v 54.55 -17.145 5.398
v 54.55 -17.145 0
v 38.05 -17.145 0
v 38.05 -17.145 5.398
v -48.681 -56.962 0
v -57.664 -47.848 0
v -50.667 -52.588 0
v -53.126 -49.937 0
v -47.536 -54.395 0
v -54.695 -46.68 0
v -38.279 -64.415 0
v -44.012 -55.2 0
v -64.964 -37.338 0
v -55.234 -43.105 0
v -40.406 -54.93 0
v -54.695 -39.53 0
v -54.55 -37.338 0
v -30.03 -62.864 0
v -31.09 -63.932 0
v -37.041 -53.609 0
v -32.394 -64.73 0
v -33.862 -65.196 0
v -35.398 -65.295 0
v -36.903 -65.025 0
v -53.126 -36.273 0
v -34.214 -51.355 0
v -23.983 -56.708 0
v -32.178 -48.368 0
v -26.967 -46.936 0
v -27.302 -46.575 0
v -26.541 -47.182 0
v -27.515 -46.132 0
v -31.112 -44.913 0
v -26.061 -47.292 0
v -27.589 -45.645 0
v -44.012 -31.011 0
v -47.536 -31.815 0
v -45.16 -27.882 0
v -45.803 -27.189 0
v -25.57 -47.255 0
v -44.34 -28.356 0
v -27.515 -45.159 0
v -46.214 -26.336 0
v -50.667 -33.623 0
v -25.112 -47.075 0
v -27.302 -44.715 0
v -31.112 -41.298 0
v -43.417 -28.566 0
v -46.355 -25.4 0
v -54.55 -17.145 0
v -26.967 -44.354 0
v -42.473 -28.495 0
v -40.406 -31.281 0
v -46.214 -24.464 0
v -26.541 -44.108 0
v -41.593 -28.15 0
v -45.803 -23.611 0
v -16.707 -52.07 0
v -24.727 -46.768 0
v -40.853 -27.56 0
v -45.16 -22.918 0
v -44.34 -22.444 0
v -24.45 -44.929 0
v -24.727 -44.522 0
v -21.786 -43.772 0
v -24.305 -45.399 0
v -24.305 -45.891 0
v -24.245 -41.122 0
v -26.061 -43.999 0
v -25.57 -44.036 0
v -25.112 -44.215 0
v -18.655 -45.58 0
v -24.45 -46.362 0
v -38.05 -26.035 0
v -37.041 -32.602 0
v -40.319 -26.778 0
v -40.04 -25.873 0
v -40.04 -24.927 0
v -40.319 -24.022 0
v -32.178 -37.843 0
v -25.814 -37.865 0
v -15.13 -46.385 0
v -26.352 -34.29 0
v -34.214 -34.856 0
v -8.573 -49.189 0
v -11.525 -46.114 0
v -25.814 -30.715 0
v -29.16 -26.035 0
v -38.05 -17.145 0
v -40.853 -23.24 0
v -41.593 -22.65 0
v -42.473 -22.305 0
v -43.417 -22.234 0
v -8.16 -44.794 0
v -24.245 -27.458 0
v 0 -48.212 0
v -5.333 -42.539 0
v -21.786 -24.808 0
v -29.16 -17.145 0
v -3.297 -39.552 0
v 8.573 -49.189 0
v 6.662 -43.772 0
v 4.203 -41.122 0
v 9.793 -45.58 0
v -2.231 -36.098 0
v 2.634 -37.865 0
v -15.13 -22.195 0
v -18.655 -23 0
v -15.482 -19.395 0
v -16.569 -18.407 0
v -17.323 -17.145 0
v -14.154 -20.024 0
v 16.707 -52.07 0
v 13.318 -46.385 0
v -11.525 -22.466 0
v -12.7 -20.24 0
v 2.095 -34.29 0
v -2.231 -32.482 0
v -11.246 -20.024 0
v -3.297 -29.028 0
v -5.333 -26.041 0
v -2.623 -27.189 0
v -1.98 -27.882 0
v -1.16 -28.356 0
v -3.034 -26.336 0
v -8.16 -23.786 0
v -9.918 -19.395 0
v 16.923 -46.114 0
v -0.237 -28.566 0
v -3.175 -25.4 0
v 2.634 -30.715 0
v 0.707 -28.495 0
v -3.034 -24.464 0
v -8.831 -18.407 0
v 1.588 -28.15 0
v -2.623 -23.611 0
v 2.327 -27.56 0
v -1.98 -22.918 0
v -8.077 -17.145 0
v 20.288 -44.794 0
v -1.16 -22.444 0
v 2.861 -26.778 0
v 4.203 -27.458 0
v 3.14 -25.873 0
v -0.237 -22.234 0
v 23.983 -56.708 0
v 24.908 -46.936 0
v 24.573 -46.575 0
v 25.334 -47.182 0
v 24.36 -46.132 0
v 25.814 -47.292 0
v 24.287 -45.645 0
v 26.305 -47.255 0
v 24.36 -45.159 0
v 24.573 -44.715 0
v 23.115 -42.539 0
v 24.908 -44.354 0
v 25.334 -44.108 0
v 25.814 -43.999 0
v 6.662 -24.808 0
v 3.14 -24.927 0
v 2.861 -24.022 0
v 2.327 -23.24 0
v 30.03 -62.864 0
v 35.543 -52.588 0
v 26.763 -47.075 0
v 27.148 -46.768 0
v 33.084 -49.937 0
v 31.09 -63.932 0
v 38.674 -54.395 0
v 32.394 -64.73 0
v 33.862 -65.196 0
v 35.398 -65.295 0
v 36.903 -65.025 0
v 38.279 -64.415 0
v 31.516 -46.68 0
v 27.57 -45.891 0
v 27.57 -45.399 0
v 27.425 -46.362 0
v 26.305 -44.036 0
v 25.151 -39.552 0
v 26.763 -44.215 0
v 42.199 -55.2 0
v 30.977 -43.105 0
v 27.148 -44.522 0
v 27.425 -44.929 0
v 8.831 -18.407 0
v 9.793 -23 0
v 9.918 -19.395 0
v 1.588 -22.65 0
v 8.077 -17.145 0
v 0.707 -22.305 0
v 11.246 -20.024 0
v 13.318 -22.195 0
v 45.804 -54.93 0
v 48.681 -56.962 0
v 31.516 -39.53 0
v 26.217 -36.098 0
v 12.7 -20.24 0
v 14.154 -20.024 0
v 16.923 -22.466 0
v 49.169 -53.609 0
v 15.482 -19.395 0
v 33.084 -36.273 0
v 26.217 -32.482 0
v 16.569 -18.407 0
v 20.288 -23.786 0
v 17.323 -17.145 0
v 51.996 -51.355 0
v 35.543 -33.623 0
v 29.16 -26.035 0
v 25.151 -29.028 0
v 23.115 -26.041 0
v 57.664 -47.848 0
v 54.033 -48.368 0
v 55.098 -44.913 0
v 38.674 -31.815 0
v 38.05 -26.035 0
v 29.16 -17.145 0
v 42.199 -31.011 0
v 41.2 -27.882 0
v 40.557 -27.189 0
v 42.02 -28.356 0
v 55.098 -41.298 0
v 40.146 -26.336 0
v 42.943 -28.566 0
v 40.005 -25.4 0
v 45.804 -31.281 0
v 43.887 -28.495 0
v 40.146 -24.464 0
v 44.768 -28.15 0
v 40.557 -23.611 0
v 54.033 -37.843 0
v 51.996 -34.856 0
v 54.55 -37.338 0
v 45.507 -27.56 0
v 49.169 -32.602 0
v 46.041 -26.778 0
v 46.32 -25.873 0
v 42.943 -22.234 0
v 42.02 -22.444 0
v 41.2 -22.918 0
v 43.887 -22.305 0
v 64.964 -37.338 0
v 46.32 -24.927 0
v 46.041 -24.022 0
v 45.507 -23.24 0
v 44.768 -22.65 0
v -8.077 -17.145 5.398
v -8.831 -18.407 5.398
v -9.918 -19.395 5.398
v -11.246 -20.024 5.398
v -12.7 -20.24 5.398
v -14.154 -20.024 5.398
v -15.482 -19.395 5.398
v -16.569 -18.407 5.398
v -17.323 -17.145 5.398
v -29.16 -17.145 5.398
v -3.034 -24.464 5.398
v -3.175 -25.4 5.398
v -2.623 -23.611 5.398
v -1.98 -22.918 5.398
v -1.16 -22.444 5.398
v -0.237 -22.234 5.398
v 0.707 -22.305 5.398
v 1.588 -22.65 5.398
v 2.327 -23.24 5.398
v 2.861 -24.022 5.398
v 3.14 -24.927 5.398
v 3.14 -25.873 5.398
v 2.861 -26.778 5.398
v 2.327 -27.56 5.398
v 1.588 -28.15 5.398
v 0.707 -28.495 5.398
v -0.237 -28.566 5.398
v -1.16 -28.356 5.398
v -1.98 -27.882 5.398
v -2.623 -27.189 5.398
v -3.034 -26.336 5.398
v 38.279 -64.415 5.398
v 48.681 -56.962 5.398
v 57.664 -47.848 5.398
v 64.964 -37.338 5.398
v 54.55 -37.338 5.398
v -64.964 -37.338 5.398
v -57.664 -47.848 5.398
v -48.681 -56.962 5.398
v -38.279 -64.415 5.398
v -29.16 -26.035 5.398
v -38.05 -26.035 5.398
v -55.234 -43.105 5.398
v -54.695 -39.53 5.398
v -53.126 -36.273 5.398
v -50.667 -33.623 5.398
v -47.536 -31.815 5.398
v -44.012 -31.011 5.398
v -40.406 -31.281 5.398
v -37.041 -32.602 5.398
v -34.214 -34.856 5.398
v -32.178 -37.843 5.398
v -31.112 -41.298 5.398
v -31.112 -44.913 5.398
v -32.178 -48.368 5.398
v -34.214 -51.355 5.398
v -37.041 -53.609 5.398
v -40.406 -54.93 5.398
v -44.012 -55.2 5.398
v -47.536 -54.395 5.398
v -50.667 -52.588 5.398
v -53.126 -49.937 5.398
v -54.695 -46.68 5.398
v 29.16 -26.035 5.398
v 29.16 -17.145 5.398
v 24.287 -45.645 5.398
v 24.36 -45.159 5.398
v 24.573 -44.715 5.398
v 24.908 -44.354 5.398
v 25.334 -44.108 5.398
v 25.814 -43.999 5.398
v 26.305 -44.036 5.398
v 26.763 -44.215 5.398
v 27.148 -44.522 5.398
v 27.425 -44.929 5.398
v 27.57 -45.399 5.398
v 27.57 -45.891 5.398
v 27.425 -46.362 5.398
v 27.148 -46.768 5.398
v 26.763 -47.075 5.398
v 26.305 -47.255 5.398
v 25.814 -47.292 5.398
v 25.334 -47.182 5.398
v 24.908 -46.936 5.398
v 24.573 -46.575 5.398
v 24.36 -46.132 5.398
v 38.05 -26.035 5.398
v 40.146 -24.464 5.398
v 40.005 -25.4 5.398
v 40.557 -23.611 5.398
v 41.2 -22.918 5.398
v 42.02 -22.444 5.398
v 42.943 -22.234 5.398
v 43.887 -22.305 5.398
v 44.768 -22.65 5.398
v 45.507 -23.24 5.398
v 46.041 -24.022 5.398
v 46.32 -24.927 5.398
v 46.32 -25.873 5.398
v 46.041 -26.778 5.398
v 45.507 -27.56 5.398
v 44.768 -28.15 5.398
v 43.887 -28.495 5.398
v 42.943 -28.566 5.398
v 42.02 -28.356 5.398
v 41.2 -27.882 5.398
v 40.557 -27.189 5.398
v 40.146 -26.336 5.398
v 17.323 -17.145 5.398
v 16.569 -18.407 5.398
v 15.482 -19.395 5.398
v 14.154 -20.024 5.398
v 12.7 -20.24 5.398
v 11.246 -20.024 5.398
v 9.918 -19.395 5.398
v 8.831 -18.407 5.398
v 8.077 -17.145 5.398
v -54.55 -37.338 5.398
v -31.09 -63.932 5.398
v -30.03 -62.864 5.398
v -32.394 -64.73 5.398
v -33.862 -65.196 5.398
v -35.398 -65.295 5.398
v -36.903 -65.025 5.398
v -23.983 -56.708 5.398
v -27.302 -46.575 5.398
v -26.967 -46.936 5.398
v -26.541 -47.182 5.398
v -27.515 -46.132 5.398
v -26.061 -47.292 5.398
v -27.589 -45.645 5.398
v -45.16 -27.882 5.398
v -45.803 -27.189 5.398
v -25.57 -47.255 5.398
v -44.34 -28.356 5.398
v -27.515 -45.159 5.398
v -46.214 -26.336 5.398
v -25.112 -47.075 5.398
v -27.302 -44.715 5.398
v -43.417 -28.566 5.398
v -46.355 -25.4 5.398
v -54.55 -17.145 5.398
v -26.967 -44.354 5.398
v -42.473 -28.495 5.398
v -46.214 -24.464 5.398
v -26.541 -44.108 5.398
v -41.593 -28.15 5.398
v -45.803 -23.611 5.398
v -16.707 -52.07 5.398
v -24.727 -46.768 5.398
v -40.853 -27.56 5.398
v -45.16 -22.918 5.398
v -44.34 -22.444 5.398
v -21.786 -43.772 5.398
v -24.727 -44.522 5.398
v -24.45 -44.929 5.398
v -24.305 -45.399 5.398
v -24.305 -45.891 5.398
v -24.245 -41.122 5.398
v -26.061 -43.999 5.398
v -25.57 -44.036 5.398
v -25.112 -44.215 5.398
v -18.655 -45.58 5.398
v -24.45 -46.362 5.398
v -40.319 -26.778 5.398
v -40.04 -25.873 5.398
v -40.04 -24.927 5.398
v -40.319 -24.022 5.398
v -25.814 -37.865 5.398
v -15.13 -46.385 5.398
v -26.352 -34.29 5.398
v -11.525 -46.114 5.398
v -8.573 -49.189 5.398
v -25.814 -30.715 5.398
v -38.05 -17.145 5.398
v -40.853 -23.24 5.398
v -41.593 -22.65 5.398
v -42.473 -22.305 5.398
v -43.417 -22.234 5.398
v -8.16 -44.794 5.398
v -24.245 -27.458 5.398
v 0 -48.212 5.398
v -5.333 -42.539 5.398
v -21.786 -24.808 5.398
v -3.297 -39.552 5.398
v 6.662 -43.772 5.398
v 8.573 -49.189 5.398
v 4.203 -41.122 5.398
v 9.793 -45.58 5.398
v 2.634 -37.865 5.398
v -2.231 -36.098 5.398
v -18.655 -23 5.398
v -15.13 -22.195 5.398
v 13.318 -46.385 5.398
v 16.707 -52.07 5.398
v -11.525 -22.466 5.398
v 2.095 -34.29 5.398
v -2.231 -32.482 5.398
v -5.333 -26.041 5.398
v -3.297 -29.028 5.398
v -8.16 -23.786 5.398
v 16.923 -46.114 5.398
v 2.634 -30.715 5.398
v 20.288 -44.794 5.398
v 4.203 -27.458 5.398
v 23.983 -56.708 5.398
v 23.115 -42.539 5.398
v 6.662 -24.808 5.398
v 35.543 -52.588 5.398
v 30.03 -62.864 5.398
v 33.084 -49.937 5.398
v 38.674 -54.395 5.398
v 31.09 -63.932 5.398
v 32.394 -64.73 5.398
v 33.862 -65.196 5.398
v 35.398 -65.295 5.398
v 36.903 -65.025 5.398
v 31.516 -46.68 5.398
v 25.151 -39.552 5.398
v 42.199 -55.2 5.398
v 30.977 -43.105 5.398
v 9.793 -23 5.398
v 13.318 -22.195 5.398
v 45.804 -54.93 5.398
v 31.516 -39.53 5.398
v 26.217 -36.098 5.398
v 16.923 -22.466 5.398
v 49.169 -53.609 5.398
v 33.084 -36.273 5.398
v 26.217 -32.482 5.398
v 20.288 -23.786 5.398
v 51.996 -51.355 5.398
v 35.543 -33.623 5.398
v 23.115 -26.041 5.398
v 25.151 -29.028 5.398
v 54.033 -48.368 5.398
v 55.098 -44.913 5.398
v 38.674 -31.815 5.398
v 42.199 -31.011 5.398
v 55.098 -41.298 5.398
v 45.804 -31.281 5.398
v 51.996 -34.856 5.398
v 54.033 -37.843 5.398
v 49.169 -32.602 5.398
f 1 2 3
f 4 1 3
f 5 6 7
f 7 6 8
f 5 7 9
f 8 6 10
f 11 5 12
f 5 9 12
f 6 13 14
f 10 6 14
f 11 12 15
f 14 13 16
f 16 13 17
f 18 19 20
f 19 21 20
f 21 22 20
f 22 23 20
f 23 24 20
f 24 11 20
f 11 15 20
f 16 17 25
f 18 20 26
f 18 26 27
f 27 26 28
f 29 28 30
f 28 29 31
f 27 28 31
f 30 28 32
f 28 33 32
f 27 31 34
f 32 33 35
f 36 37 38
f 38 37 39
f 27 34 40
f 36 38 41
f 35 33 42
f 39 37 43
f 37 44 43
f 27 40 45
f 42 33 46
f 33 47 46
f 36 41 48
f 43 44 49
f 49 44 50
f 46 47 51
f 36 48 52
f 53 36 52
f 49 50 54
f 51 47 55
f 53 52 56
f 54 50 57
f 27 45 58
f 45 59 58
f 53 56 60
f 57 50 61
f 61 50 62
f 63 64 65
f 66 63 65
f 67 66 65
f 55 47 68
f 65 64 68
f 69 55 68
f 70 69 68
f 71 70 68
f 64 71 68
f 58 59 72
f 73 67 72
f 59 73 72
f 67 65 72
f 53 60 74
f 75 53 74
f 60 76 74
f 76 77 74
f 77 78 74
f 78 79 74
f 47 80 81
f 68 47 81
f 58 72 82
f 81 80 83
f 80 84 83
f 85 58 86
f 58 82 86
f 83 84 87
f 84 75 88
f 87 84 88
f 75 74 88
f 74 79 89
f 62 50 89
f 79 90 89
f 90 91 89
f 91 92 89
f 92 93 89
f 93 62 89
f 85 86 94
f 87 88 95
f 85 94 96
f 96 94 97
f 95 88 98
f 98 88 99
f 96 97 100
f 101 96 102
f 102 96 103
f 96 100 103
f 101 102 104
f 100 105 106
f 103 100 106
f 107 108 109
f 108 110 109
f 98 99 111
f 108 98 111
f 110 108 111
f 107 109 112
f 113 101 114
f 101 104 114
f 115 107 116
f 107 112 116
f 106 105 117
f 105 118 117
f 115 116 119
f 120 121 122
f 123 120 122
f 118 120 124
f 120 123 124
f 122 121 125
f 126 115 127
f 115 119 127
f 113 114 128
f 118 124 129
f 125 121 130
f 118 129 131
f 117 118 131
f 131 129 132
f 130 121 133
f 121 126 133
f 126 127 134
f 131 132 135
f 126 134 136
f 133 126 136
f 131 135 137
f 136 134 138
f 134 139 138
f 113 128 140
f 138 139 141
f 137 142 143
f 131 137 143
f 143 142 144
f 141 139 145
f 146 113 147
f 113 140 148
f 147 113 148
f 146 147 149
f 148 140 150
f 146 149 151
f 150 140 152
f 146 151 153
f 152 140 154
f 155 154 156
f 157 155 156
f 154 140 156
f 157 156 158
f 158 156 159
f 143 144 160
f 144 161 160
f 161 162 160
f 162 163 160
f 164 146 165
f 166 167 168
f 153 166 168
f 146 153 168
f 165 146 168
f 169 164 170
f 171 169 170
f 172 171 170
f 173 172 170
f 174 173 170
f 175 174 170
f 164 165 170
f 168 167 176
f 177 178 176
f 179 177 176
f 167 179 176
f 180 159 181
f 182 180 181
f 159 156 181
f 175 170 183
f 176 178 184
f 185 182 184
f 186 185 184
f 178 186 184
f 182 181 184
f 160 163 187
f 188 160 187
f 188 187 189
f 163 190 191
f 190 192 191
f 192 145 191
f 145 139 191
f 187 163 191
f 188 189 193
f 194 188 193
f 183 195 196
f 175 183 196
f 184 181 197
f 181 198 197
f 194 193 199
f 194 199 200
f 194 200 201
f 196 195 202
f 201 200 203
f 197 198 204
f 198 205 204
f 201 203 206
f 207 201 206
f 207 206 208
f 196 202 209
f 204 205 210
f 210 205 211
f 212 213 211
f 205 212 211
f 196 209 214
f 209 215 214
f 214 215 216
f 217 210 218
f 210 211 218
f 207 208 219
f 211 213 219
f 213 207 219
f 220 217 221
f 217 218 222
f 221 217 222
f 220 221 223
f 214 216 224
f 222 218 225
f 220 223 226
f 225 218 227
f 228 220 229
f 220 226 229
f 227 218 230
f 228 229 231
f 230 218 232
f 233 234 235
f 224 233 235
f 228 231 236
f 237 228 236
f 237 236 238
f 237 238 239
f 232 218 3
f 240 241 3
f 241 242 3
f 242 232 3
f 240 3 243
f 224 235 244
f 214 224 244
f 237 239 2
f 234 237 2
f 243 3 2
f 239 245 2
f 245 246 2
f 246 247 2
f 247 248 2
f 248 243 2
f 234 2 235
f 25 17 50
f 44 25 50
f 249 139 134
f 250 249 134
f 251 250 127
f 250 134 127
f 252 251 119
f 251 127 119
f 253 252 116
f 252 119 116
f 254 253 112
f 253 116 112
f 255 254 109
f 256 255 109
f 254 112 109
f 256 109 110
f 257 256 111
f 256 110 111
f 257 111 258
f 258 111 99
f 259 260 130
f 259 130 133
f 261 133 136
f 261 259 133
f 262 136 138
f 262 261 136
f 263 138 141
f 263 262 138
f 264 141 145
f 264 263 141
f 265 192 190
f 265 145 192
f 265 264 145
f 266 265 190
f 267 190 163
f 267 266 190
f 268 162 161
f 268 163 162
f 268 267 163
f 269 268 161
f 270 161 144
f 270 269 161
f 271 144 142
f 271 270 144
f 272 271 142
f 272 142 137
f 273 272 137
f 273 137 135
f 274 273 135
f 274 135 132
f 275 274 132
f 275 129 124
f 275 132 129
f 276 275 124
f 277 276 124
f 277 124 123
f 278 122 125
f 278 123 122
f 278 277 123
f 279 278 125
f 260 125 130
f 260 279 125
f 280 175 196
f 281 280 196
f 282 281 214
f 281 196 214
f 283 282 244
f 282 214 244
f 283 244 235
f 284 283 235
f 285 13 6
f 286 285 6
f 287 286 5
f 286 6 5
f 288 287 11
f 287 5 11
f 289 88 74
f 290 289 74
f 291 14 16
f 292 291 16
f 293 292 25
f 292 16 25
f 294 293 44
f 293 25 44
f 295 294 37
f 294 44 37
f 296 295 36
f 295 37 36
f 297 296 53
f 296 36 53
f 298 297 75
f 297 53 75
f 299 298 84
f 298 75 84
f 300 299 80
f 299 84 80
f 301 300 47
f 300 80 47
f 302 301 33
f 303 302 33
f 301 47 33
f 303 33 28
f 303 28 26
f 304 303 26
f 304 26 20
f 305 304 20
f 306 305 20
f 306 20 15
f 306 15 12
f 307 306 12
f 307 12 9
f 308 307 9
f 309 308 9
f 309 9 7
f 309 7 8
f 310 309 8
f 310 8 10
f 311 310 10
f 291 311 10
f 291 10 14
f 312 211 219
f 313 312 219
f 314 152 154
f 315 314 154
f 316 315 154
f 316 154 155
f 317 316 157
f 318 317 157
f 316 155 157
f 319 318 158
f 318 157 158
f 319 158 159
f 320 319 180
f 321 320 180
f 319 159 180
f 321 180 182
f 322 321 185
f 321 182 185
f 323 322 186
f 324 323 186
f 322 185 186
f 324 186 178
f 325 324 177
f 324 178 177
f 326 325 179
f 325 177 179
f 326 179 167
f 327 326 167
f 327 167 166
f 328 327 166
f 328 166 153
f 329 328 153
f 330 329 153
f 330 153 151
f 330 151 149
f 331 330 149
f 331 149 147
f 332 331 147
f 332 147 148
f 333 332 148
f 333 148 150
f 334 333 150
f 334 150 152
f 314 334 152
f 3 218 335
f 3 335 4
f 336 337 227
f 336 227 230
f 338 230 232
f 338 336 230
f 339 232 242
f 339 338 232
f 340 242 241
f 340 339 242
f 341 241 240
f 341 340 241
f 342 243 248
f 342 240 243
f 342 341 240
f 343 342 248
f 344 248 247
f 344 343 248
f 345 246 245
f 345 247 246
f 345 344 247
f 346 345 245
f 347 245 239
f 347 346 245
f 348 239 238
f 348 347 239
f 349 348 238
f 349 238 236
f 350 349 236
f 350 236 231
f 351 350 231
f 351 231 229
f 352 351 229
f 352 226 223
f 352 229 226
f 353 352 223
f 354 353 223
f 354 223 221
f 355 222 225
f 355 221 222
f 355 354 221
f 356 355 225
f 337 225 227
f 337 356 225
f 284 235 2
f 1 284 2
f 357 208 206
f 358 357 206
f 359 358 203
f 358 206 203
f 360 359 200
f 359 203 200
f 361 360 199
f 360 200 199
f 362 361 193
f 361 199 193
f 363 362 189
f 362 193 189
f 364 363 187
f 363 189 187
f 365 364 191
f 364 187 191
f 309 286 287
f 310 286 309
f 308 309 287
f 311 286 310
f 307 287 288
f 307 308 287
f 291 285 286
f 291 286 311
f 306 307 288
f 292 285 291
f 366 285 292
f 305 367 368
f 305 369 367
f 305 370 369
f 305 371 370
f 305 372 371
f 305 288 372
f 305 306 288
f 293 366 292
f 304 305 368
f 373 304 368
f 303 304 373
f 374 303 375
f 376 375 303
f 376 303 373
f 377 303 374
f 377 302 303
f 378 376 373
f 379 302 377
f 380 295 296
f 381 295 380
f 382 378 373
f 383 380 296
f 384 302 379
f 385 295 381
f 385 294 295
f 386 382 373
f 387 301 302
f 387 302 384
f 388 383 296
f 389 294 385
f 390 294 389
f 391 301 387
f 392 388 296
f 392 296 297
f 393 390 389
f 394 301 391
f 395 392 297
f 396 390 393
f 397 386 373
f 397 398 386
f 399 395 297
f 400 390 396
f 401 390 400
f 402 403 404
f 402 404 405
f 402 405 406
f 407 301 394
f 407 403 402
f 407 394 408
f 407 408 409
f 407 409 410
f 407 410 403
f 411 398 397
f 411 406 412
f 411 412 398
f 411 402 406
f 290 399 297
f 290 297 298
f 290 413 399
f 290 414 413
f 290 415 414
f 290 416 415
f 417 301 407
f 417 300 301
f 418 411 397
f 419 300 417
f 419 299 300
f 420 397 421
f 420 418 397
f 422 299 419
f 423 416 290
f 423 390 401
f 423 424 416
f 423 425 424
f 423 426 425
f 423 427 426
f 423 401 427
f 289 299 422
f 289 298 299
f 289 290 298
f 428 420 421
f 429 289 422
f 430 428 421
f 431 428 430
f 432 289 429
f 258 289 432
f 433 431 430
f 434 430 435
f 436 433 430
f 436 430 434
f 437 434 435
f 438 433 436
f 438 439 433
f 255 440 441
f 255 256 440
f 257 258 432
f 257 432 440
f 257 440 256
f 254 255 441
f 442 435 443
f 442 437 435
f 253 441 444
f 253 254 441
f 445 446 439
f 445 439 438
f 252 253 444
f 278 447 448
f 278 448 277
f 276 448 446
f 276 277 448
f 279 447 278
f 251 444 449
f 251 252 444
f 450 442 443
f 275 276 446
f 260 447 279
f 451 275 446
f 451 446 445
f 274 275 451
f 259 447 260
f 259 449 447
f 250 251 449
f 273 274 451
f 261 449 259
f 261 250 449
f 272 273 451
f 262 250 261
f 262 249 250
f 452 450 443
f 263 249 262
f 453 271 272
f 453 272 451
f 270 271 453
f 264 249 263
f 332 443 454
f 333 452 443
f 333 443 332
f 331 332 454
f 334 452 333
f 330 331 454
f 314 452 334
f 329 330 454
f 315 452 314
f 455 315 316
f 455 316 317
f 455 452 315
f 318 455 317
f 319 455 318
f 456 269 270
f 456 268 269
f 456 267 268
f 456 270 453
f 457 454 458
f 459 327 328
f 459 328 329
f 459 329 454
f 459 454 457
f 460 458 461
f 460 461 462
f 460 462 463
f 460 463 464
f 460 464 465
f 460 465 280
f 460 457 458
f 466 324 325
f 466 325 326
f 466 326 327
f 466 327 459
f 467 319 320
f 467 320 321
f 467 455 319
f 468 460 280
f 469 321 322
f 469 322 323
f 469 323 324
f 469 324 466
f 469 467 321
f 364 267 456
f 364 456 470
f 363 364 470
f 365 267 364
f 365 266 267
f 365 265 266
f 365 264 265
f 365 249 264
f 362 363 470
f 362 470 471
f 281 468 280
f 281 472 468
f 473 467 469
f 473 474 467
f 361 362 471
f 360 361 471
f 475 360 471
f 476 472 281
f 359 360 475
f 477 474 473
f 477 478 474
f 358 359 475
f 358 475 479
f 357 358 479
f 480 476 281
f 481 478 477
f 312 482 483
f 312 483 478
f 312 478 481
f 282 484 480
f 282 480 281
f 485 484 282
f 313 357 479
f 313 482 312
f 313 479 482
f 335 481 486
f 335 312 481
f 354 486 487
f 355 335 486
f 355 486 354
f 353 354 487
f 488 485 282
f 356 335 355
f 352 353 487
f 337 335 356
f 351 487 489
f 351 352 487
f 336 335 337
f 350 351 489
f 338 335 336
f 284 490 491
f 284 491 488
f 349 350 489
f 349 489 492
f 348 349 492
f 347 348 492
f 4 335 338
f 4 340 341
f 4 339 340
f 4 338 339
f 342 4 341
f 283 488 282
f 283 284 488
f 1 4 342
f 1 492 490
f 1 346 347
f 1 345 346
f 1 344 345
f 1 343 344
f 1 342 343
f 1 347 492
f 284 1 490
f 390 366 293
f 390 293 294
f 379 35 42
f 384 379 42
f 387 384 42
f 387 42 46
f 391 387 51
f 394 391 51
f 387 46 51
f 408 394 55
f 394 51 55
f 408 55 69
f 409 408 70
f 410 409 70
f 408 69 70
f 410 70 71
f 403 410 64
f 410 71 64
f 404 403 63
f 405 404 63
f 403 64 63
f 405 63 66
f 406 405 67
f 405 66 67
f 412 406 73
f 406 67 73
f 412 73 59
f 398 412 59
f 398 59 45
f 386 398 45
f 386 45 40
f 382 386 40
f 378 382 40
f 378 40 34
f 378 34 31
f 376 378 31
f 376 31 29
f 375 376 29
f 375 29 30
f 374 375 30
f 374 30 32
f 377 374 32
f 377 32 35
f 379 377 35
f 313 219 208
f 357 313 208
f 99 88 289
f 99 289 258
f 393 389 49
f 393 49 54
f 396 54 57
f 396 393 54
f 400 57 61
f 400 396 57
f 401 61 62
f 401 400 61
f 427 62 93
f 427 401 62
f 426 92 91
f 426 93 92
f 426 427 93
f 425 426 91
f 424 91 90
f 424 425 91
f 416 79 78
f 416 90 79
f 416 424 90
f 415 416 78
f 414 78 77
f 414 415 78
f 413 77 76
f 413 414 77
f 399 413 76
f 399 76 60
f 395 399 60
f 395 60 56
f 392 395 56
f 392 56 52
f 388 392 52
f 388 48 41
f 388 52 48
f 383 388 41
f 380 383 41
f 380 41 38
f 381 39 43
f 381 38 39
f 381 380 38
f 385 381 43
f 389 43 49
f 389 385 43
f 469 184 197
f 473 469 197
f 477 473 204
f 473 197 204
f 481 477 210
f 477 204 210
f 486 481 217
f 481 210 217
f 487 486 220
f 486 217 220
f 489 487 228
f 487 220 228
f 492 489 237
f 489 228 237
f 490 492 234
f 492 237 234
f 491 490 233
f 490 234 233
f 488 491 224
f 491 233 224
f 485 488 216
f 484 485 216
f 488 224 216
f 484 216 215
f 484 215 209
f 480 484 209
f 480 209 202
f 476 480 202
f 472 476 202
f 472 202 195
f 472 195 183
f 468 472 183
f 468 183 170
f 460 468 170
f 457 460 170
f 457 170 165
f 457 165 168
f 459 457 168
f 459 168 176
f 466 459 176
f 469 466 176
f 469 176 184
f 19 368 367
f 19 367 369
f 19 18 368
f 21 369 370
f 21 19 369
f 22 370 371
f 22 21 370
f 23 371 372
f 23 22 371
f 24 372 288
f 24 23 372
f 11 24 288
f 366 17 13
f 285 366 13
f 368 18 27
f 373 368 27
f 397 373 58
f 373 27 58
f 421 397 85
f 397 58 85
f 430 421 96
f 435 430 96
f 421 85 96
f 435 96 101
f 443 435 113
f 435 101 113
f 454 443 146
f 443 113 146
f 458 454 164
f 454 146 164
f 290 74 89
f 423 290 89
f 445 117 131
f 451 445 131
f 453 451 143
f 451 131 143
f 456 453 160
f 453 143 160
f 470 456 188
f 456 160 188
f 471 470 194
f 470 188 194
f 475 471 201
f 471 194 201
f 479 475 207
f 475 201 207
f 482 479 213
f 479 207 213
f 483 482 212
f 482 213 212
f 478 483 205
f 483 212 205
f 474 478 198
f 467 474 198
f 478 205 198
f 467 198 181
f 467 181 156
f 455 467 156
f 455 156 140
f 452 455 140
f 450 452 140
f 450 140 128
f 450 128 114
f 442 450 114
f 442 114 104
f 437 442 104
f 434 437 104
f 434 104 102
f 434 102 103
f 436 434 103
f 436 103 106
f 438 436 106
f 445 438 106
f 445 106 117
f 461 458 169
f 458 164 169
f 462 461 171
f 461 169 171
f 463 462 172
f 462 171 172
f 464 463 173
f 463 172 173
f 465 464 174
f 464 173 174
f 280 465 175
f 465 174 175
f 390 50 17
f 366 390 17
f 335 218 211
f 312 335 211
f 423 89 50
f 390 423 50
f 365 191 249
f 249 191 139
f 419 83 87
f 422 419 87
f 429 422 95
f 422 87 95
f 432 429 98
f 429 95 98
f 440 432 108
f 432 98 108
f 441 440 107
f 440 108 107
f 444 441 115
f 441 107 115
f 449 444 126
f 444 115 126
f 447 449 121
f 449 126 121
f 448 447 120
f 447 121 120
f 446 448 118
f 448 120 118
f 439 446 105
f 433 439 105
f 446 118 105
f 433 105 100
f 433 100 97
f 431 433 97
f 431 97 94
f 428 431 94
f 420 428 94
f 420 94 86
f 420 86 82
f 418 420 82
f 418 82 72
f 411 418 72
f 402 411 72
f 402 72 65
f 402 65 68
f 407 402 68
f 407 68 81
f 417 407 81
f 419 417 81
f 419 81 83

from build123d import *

# Parameters (mm, degrees)
SKETCH1_R                 = 1.651
BOSS_EXTRUDE2_DEPTH       = 5.3975
SKETCH2_R                 = 1.143
CUT_EXTRUDE1_DEPTH        = 6.3975
SKETCH3_R                 = 12.1285
CUT_EXTRUDE2_DEPTH        = 6.3975
SKETCH4_W                 = 28.562713242
SKETCH4_H                 = 11.677503754
BOSS_EXTRUDE3_DEPTH       = 5.3975
SKETCH5_W                 = 216.7214489
SKETCH5_H                 = 130.569220634
CUT_EXTRUDE4_DEPTH        = 6.3975
SKETCH6_R                 = 38.1
CUT_EXTRUDE5_DEPTH        = 60.96
FILLET1_R                 = 6.35
FILLET2_R                 = 6.35
SKETCH102_W               = 8.89
SKETCH102_H               = 8.89
CUT_EXTRUDE101_DEPTH      = 6.3975001
SKETCH105_R               = 5
CUT_EXTRUDE104_DEPTH      = 10
SKETCH106_R               = 3.175
CUT_EXTRUDE105_DEPTH      = 103.378
CUT_EXTRUDE105_DEPTH_BACK = 1
SKETCH158_R               = 1.651
CUT_EXTRUDE157_DEPTH      = 97.79


with BuildPart() as part:
    # Sketch1 → Boss-Extrude2 (new body)
    with BuildSketch(Plane.XY):
        with BuildLine():
            Line((-64.964441474, 37.338), (-54.550441474, 37.338))
            Line((-54.550441474, 37.338), (-54.550441474, -37.338))
            Line((-54.550441474, -37.338), (-64.964441474, -37.338))
            ThreePointArc((-64.964441474, -37.338), (0, -74.93), (64.964441474, -37.338))
            Line((64.964441474, -37.338), (54.550441474, -37.338))
            Line((54.550441474, -37.338), (54.550441474, 37.338))
            Line((54.550441474, 37.338), (64.964441474, 37.338))
            ThreePointArc((64.964441474, 37.338), (0, 74.93), (-64.964441474, 37.338))
        make_face()
        with Locations((-46.482, 11.049)):
            Circle(SKETCH1_R, mode=Mode.SUBTRACT)
        with Locations((-21.083270032, 10.795)):
            Circle(SKETCH1_R, mode=Mode.SUBTRACT)
        with Locations((-21.083270032, -10.795)):
            Circle(SKETCH1_R, mode=Mode.SUBTRACT)
        with Locations((-46.482, -11.049)):
            Circle(SKETCH1_R, mode=Mode.SUBTRACT)
        with Locations((46.482, -11.049)):
            Circle(SKETCH1_R, mode=Mode.SUBTRACT)
        with Locations((21.083270032, -10.795)):
            Circle(SKETCH1_R, mode=Mode.SUBTRACT)
        with Locations((21.083270032, 10.795)):
            Circle(SKETCH1_R, mode=Mode.SUBTRACT)
        with Locations((46.482, 11.049)):
            Circle(SKETCH1_R, mode=Mode.SUBTRACT)
    extrude(amount=BOSS_EXTRUDE2_DEPTH)

    # Sketch2 → Cut-Extrude1 (cut, through all)
    with BuildSketch(Plane.XY.offset(5.3975)):
        with Locations((-6.731, 62.23)):
            Circle(SKETCH2_R)
        with Locations((6.731, 62.23)):
            Circle(SKETCH2_R)
    extrude(amount=-CUT_EXTRUDE1_DEPTH, mode=Mode.SUBTRACT)

    # Sketch3 → Cut-Extrude2 (cut, through all)
    with BuildSketch(Plane(origin=(0, 0, 0), x_dir=(-1, 0, 0), z_dir=(0, 0, -1))):
        with Locations((-43.105229381, -43.105229381)):
            Circle(SKETCH3_R)
        with Locations((14.224, -34.29)):
            Circle(SKETCH3_R)
        with Locations((14.224, 34.29)):
            Circle(SKETCH3_R)
        with Locations((-43.105229381, 43.105229381)):
            Circle(SKETCH3_R)
        with Locations((43.105229381, 43.105229381)):
            Circle(SKETCH3_R)
        with Locations((-14.224, 34.29)):
            Circle(SKETCH3_R)
        with Locations((-14.224, -34.29)):
            Circle(SKETCH3_R)
        with Locations((43.105229381, -43.105229381)):
            Circle(SKETCH3_R)
    extrude(amount=-CUT_EXTRUDE2_DEPTH, mode=Mode.SUBTRACT)

    # Sketch4 → Boss-Extrude3 (add)
    with BuildSketch(Plane(origin=(0, 0, 0), x_dir=(-1, 0, 0), z_dir=(0, 0, -1))):
        with Locations((-1.488809975, 62.152540216)):
            Rectangle(SKETCH4_W, SKETCH4_H)
    extrude(amount=-BOSS_EXTRUDE3_DEPTH)

    # Sketch5 → Cut-Extrude4 (cut, through all)
    with BuildSketch(Plane(origin=(0, 0, 0), x_dir=(-1, 0, 0), z_dir=(0, 0, -1))):
        with Locations((23.316688373, 48.139610317)):
            Rectangle(SKETCH5_W, SKETCH5_H)
    extrude(amount=-CUT_EXTRUDE4_DEPTH, mode=Mode.SUBTRACT)

    # Sketch6 → Cut-Extrude5 (cut)
    with BuildSketch(Plane(origin=(0, 0, 0), x_dir=(-1, 0, 0), z_dir=(0, 0, -1))):
        with Locations((0, -86.312058398)):
            Circle(SKETCH6_R)
    extrude(amount=-CUT_EXTRUDE5_DEPTH, mode=Mode.SUBTRACT)

    # Fillet1
    fillet1_edges = [part.edges().sort_by_distance(p)[0] for p in [
        (-33.000960548, -67.271401821, 2.69875),
    ]]
    fillet(fillet1_edges, radius=FILLET1_R)

    # Fillet2
    fillet2_edges = [part.edges().sort_by_distance(p)[0] for p in [
        (33.000960548, -67.271401821, 2.69875),
    ]]
    fillet(fillet2_edges, radius=FILLET2_R)

    # Sketch102 → Cut-Extrude101 (cut, through all)
    with BuildSketch(Plane(origin=(0, 0, 0), x_dir=(-1, 0, 0), z_dir=(0, 0, -1))):
        with Locations((-33.605441474, -21.59)):
            Rectangle(SKETCH102_W, SKETCH102_H)
        with Locations((33.605441474, -21.59)):
            Rectangle(SKETCH102_W, SKETCH102_H)
    extrude(amount=-CUT_EXTRUDE101_DEPTH, mode=Mode.SUBTRACT)

    # Sketch105 → Cut-Extrude104 (cut)
    with BuildSketch(Plane(origin=(0, 0, 0), x_dir=(-1, 0, 0), z_dir=(0, 0, -1))):
        with Locations((-12.7, -15.24)):
            Circle(SKETCH105_R)
        with Locations((12.7, -15.24)):
            Circle(SKETCH105_R)
    extrude(amount=-CUT_EXTRUDE104_DEPTH, mode=Mode.SUBTRACT)

    # Sketch106 → Cut-Extrude105 (cut, two sides)
    with BuildSketch(Plane(origin=(30.092005081, 4.08352975, 22.2885), x_dir=(-1, 0, 0), z_dir=(0, 0, -1))) as cut_extrude105_sk:
        with Locations((73.272005081, -29.48352975)):
            Circle(SKETCH106_R)
        with Locations((30.092005081, -29.48352975)):
            Circle(SKETCH106_R)
        with Locations((-13.087994919, -29.48352975)):
            Circle(SKETCH106_R)
    extrude(amount=CUT_EXTRUDE105_DEPTH, mode=Mode.SUBTRACT)
    extrude(cut_extrude105_sk.sketch, amount=-CUT_EXTRUDE105_DEPTH_BACK, mode=Mode.SUBTRACT)

    # Sketch158 → Cut-Extrude157 (cut)
    with BuildSketch(Plane(origin=(30.092005081, 4.08352975, -24.638), x_dir=(-1, 0, 0), z_dir=(0, 0, -1))):
        with Locations((4.154396091, -49.728759131)):
            Circle(SKETCH158_R)
        with Locations((56.02961407, -49.728759131)):
            Circle(SKETCH158_R)
    extrude(amount=-CUT_EXTRUDE157_DEPTH, mode=Mode.SUBTRACT)


solid = part.part
